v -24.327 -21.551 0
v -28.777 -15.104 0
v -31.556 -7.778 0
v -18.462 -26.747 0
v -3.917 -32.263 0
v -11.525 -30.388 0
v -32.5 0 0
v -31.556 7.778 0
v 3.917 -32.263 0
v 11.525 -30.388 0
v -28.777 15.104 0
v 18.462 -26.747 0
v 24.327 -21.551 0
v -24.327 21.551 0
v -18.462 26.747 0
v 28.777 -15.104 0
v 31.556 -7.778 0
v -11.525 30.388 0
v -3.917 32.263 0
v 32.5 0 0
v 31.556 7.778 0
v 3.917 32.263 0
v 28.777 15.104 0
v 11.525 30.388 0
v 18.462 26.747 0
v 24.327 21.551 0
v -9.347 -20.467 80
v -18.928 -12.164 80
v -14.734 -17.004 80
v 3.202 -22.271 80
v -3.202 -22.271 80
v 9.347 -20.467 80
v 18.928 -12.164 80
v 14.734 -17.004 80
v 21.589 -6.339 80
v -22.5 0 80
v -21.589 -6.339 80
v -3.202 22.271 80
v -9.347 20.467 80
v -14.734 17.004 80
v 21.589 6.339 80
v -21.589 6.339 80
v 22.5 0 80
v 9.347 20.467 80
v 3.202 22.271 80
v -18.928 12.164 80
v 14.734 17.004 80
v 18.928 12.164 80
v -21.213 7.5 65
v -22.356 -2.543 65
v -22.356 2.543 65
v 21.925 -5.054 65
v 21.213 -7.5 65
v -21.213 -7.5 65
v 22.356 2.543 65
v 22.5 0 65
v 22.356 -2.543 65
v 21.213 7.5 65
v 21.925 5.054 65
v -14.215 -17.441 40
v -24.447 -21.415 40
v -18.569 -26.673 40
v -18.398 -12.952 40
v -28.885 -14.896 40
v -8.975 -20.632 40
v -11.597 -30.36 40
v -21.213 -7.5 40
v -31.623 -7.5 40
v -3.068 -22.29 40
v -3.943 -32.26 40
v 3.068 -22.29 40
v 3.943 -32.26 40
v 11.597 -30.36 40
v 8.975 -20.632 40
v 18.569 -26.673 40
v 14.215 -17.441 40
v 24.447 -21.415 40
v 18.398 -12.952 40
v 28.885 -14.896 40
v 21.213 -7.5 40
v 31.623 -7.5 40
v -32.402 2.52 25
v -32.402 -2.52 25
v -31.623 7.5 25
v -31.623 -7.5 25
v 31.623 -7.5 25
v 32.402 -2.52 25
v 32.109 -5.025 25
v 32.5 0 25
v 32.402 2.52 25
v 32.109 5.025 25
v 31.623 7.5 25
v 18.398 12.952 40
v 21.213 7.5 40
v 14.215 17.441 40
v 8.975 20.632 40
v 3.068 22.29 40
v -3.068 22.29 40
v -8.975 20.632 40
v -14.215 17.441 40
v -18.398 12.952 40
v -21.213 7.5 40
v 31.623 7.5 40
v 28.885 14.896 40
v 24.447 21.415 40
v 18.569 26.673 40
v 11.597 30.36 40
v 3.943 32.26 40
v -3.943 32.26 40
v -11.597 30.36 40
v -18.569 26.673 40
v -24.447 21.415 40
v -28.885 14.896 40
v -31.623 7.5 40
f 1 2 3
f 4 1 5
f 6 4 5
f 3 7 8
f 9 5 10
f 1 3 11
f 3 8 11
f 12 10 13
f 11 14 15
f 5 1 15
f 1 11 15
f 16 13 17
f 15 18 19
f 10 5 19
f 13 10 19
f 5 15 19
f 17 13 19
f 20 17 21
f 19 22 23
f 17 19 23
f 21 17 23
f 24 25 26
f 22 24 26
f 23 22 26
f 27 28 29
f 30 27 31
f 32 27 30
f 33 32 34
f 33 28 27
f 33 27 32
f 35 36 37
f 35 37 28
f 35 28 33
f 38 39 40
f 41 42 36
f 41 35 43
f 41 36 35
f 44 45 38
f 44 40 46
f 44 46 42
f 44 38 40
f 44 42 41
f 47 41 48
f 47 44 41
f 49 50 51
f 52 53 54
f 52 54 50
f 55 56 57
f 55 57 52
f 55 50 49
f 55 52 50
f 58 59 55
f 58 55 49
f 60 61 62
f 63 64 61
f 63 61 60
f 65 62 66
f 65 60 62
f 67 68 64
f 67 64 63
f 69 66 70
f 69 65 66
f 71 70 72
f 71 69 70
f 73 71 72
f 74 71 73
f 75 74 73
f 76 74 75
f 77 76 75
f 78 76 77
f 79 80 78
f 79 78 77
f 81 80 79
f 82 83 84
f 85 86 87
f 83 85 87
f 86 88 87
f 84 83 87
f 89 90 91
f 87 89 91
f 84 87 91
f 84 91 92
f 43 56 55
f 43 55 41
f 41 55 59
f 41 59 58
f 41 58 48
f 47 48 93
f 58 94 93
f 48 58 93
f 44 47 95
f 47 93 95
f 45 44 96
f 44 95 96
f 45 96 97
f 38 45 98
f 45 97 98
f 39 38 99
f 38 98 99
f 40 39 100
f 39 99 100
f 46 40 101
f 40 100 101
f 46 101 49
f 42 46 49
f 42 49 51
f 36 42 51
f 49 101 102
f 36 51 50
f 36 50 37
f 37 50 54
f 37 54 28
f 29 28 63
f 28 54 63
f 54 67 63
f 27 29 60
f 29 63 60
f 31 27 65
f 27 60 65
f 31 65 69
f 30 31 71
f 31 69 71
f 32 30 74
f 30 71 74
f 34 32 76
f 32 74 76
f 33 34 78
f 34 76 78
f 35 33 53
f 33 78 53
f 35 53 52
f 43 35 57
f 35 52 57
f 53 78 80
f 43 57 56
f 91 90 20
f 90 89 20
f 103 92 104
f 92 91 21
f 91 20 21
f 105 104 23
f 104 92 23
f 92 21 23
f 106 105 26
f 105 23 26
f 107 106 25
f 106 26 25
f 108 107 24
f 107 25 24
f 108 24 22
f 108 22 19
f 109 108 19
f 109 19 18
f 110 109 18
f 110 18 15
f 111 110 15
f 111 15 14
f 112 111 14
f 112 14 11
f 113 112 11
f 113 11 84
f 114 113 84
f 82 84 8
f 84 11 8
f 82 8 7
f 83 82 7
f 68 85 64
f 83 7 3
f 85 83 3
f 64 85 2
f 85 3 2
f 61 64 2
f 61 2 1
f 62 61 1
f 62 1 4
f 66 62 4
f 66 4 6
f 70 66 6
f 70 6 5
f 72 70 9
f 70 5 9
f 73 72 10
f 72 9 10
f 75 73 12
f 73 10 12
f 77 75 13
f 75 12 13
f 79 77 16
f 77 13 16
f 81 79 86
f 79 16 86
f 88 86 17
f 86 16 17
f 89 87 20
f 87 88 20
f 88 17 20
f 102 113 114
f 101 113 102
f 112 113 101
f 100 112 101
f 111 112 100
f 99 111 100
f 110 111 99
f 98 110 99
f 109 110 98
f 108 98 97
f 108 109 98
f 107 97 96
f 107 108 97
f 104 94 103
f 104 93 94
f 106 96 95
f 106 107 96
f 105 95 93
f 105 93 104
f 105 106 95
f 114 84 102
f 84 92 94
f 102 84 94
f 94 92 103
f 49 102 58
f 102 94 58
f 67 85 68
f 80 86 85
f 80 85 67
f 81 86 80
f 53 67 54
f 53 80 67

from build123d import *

# Parameters (mm, degrees)
F0_R     = 32.5
F1_DEPTH = 40
F2_R     = 22.5
F3_DEPTH = 40
F4_W     = 15
F4_H     = 40
F5_DEPTH = 32.5


with BuildPart() as f1:
    # F0 (on Top) → F1 (new body)
    with BuildSketch(Plane.XY):
        Circle(F0_R)
    extrude(amount=F1_DEPTH)

    # F2 (on face) → F3 (join)
    with BuildSketch(Plane.XY.offset(40)):
        Circle(F2_R)
    extrude(amount=F3_DEPTH)

    # F4 (on Right) → F5 (cut, symmetric)
    with BuildSketch(Plane.YZ):
        with Locations((0, 45)):
            Rectangle(F4_W, F4_H)
    extrude(amount=F5_DEPTH, both=True, mode=Mode.SUBTRACT)


solid = f1.part
